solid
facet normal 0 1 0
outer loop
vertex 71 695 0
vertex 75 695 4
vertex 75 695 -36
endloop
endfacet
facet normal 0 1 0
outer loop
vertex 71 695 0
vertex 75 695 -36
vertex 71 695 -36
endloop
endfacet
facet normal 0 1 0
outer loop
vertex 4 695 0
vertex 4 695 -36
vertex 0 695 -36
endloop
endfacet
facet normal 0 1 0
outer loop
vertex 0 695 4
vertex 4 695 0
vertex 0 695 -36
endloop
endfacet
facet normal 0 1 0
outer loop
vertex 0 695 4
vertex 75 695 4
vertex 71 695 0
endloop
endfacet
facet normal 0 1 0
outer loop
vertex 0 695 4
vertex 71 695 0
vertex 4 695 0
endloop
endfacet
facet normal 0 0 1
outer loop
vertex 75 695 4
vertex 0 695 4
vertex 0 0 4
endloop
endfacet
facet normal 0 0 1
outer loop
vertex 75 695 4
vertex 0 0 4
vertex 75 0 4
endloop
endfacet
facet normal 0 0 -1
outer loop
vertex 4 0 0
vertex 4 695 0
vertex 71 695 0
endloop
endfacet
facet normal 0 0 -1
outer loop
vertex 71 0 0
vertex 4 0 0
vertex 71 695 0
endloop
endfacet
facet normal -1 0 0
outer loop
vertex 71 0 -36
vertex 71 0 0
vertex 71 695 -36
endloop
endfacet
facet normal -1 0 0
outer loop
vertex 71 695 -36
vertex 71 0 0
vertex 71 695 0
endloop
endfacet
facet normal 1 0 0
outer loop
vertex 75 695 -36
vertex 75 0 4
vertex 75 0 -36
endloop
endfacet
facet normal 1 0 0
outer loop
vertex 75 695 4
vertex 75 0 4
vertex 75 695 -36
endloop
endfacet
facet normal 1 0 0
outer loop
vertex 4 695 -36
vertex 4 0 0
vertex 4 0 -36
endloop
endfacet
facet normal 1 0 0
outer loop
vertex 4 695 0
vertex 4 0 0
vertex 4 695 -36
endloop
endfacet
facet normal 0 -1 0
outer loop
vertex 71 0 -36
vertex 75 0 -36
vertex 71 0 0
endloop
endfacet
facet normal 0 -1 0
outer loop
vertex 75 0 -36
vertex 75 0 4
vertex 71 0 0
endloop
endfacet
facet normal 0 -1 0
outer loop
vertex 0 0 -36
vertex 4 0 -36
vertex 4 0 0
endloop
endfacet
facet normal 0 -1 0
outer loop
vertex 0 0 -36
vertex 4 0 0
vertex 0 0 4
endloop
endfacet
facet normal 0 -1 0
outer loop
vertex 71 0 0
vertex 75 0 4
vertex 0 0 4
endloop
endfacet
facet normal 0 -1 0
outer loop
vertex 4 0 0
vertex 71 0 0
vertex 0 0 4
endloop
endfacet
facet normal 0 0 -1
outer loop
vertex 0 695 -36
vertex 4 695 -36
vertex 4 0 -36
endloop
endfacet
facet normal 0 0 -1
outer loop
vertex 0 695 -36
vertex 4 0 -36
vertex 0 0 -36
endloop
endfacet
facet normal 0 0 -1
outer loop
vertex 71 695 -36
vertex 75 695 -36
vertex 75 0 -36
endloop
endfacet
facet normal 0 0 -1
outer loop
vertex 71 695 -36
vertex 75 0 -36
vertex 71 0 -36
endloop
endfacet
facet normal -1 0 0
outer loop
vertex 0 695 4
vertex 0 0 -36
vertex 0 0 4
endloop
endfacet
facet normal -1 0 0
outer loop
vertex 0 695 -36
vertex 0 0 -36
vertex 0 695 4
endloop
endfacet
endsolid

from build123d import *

# Parameters (mm, degrees)
SKETCH_1_W      = 75
SKETCH_1_H      = 695
EXTRUDE_1_DEPTH = 4
SKETCH_2_W      = 4
SKETCH_2_H      = 695
EXTRUDE_2_DEPTH = 36


with BuildPart() as part:
    # 스케치1 → 보스-돌출1 (new body)
    with BuildSketch(Plane.XY):
        with Locations((37.5, 347.5)):
            Rectangle(SKETCH_1_W, SKETCH_1_H)
    extrude(amount=EXTRUDE_1_DEPTH)

    # 스케치2 → 보스-돌출2 (add)
    with BuildSketch(Plane(origin=(0, 0, 0), x_dir=(-1, 0, 0), z_dir=(0, 0, -1))):
        with Locations((-73, 347.5)):
            Rectangle(SKETCH_2_W, SKETCH_2_H)
        with Locations((-2, 347.5)):
            Rectangle(SKETCH_2_W, SKETCH_2_H)
    extrude(amount=EXTRUDE_2_DEPTH)


solid = part.part
